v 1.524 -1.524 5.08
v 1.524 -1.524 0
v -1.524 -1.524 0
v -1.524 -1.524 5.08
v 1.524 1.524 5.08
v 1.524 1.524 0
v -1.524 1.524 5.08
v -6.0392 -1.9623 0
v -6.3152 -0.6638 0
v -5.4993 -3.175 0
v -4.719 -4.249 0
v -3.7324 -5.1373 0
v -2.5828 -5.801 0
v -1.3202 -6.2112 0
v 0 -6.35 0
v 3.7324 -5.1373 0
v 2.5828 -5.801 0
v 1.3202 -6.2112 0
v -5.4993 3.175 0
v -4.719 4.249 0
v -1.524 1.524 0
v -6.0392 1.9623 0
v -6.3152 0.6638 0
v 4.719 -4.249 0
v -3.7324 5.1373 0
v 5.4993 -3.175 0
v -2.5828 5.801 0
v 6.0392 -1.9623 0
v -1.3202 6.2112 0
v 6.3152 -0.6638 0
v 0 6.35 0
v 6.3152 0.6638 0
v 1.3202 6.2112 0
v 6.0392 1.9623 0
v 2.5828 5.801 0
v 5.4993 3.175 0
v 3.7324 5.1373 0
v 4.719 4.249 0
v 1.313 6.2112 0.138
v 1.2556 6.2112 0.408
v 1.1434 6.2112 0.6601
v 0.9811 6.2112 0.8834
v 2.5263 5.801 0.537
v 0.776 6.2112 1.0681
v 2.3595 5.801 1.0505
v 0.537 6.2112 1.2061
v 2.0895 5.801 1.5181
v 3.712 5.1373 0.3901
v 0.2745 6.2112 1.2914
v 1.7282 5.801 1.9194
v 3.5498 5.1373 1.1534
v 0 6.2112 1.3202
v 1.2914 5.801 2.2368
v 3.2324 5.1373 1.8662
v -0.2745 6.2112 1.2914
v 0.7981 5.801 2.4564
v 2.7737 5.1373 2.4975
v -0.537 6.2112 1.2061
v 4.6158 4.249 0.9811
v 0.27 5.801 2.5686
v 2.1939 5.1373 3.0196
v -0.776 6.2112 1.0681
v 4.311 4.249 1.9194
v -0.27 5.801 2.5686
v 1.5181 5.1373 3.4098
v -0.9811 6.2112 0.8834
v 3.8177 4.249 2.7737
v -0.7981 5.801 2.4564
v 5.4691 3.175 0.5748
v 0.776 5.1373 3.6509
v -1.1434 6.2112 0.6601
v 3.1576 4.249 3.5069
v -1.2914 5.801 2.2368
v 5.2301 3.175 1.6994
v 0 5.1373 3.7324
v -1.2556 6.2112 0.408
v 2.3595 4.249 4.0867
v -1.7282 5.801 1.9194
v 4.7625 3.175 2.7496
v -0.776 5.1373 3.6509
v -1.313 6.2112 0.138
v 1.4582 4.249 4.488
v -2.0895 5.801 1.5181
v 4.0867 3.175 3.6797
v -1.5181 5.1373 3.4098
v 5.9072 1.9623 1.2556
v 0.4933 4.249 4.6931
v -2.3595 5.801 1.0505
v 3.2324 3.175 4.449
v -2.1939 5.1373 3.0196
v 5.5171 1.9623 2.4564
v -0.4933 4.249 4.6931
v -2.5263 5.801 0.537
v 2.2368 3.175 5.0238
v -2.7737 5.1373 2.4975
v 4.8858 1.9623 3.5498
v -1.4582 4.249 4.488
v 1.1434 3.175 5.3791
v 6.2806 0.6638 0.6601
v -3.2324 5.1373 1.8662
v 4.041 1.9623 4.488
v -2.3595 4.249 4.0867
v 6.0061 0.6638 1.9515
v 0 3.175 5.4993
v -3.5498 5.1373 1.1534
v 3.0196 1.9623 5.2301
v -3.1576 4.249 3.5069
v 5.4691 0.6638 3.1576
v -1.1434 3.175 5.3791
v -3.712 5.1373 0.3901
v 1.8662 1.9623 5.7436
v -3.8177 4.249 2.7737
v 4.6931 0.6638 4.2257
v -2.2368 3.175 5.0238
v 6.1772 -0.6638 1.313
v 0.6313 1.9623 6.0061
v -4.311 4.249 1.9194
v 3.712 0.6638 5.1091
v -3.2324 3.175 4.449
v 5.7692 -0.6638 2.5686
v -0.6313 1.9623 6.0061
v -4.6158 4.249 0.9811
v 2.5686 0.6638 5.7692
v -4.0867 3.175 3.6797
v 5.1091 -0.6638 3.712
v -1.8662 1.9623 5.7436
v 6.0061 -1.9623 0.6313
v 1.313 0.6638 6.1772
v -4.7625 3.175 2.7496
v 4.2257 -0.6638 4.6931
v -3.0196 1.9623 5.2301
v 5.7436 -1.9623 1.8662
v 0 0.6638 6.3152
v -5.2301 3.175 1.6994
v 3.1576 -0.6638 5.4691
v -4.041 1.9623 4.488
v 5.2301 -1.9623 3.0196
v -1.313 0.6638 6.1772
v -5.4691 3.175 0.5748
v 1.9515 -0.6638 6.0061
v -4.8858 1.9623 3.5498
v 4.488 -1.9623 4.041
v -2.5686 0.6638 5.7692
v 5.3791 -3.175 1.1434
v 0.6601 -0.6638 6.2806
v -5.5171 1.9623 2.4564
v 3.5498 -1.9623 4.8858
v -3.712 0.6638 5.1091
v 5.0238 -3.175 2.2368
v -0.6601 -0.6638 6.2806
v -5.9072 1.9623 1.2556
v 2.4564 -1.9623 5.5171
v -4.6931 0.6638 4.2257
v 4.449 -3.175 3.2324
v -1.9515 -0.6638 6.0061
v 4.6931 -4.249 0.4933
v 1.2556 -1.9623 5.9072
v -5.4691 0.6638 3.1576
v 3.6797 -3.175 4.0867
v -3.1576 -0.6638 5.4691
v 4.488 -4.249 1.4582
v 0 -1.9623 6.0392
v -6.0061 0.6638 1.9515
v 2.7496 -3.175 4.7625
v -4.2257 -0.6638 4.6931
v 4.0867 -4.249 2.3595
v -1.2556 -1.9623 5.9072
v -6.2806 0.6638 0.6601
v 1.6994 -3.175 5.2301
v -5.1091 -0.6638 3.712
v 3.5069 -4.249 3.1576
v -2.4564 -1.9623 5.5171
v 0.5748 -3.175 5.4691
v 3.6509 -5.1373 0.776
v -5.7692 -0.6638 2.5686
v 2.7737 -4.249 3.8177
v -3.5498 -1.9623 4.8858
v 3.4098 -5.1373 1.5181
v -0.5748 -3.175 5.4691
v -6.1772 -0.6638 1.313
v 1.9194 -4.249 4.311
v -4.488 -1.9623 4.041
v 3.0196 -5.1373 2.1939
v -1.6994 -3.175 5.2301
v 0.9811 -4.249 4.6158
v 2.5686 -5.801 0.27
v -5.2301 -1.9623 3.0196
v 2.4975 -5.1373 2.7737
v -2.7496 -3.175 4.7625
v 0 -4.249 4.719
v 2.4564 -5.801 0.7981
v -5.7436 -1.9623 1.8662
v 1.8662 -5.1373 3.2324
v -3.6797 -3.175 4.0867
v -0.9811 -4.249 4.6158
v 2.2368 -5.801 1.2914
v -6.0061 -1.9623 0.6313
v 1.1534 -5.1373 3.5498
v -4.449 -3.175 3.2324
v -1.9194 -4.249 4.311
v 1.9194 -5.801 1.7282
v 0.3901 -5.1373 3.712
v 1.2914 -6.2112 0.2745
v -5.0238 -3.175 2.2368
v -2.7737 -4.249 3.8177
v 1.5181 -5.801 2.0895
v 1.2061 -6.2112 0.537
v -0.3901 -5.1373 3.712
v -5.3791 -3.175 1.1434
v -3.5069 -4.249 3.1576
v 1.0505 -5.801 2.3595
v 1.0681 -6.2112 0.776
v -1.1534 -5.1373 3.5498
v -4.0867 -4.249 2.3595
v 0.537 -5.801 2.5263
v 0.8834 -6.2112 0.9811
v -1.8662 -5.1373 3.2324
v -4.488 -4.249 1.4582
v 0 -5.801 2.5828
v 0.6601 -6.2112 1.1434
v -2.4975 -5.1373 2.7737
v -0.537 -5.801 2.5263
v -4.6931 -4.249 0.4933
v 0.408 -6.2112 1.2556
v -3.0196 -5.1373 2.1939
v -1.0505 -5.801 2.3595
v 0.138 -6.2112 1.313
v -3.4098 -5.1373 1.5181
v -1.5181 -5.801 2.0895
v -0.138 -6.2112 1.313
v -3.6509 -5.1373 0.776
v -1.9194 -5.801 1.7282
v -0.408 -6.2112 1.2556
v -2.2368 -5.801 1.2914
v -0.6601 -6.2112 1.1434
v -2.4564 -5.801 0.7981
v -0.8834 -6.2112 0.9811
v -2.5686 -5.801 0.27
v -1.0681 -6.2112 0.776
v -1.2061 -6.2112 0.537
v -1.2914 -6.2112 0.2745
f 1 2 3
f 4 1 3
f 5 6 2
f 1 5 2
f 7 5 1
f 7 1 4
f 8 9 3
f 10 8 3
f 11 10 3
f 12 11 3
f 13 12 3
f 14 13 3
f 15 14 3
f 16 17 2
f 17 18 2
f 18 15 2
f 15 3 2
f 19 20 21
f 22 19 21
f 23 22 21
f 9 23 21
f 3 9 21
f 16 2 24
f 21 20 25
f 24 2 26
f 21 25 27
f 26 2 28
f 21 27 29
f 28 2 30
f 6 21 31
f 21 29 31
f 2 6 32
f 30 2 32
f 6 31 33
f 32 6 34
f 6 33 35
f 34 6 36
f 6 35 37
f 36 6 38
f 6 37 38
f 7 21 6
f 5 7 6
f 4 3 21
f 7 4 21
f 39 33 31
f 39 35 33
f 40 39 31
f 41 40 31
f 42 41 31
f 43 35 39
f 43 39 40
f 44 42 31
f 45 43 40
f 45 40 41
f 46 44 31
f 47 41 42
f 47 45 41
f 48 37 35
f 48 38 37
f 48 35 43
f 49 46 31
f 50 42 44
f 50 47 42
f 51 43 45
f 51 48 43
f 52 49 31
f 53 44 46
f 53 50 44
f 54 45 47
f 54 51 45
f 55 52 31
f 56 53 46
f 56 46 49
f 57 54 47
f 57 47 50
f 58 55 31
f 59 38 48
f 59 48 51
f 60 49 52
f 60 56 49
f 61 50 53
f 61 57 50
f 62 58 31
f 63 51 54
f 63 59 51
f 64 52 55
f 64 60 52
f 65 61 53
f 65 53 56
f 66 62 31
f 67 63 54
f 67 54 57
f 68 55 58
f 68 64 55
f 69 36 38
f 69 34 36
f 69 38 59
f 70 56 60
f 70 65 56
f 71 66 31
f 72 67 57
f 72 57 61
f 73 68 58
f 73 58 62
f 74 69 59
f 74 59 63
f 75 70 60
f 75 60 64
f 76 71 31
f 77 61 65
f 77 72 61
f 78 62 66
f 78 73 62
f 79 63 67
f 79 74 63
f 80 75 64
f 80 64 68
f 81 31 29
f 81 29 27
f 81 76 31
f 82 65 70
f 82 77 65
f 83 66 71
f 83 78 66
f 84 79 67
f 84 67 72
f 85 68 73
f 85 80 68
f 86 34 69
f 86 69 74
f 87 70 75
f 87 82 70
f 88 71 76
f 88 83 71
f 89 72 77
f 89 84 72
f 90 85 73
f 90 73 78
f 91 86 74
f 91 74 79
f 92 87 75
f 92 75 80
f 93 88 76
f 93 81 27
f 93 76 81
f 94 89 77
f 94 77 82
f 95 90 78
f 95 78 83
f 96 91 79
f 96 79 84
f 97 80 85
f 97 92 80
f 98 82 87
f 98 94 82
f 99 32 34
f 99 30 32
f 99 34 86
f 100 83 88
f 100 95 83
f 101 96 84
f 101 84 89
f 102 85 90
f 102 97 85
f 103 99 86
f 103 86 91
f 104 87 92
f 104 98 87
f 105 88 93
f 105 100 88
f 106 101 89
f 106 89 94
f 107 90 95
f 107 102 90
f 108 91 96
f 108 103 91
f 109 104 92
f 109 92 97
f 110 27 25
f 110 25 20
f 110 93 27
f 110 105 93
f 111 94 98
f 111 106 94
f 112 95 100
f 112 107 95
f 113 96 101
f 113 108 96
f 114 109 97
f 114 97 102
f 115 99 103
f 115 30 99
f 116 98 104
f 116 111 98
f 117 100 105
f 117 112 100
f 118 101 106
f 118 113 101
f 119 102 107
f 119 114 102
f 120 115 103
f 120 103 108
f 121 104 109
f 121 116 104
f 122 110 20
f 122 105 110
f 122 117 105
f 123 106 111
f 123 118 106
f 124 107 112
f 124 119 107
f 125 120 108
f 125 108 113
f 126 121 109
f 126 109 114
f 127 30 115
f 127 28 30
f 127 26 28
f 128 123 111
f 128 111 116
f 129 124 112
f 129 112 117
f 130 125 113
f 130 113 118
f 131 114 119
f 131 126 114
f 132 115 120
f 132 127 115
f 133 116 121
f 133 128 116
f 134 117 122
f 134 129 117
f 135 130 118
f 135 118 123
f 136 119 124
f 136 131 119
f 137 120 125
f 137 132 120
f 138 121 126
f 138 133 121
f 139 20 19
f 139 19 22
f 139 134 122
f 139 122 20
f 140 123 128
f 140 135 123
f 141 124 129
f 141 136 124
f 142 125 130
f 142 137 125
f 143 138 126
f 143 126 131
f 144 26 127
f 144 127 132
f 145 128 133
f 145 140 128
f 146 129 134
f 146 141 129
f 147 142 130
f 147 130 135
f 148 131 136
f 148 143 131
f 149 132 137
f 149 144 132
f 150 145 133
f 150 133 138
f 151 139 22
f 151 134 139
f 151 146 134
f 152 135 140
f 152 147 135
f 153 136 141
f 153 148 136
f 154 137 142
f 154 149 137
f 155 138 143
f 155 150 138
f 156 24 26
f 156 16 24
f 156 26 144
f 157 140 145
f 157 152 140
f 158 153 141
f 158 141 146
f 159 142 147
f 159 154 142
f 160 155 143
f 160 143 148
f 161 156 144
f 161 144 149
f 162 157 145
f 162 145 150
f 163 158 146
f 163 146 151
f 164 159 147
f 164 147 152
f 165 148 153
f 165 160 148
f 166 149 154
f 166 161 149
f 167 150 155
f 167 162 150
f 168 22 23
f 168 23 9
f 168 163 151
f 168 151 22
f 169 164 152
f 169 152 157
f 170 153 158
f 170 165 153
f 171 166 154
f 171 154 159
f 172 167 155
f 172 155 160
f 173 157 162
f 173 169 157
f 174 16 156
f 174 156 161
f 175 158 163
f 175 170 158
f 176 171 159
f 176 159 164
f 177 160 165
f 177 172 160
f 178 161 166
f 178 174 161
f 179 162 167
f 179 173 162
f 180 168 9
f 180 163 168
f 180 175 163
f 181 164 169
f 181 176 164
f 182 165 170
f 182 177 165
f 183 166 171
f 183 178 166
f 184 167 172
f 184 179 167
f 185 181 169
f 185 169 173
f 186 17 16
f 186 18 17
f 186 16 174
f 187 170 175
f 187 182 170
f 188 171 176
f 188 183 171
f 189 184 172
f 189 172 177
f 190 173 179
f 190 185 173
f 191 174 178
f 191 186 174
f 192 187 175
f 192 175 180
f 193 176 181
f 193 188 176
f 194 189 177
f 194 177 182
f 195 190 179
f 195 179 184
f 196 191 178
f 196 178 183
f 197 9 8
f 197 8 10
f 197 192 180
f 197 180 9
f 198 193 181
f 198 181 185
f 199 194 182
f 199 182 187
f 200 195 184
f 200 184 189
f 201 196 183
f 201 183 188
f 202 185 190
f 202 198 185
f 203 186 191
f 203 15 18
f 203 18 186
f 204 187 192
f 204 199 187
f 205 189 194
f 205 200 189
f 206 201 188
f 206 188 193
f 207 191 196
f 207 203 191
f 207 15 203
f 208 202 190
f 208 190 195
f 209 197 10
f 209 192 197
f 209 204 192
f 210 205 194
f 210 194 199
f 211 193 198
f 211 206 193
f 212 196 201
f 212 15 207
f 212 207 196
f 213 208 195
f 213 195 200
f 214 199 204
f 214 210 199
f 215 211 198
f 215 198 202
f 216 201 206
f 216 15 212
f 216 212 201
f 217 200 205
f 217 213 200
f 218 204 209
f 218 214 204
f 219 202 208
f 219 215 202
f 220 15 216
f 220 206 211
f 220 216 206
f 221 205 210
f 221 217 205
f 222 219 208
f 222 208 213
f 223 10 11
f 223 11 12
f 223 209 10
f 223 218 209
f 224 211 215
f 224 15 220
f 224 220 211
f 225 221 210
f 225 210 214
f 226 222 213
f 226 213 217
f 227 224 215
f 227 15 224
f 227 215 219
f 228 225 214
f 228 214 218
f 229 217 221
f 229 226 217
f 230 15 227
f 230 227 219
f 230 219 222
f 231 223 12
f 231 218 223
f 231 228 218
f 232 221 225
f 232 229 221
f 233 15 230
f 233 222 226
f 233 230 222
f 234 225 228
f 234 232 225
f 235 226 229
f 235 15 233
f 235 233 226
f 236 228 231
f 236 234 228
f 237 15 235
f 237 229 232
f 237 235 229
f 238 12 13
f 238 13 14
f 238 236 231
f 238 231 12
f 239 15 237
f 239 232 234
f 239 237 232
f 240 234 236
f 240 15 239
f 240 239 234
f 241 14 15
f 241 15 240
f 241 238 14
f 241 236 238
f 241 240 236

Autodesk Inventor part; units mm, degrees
ref_plane "YZ Plane" through (0, 0, 0) normal (1, 0, 0) x (0, 1, 0)
ref_plane "XZ Plane" through (0, 0, 0) normal (0, 1, 0) x (-1, 0, 0)
ref_plane "XY Plane" through (0, 0, 0) normal (0, 0, 1) x (1, 0, 0)
sketch "Sketch1" plane through (0, 0, 0) normal (0, 0, 1) x (1, 0, 0)
  circle A0 centre (0, 0) radius 6.35
  line L0 (0, 6.35) -> (0, -6.35)
  dimension "d0" = 12.7
revolve "Revolution1" add sketch "Sketch1" angle 180 about axis through (0, 6.35, 0) along (0, 1, 0) picked at (-3.484, 2.1167) contours L0 A0
sketch "Sketch3" plane through (0, 0, 0) normal (0, 0, -1) x (-1, 0, 0)
  line L0 (0, 0) -> (0, 1.524) construction
  line L1 (0, 1.524) -> (1.524, 1.524) construction
  line L2 (0, 0) -> (0, -1.524) construction
  line L3 (0, -1.524) -> (-1.524, -1.524) construction
  line L4 (1.524, 1.524) -> (-1.524, 1.524)
  line L5 (-1.524, 1.524) -> (-1.524, -1.524)
  line L6 (-1.524, -1.524) -> (1.524, -1.524)
  line L7 (1.524, -1.524) -> (1.524, 1.524)
  dimension "d5" = 1.524
  dimension "d11" = 1.524
  dimension "d12" = 1.524
  dimension "d13" = 1.524
extrude "Extrusion3" cut sketch "Sketch3" against normal blind 5.08
properties part number "ball"
